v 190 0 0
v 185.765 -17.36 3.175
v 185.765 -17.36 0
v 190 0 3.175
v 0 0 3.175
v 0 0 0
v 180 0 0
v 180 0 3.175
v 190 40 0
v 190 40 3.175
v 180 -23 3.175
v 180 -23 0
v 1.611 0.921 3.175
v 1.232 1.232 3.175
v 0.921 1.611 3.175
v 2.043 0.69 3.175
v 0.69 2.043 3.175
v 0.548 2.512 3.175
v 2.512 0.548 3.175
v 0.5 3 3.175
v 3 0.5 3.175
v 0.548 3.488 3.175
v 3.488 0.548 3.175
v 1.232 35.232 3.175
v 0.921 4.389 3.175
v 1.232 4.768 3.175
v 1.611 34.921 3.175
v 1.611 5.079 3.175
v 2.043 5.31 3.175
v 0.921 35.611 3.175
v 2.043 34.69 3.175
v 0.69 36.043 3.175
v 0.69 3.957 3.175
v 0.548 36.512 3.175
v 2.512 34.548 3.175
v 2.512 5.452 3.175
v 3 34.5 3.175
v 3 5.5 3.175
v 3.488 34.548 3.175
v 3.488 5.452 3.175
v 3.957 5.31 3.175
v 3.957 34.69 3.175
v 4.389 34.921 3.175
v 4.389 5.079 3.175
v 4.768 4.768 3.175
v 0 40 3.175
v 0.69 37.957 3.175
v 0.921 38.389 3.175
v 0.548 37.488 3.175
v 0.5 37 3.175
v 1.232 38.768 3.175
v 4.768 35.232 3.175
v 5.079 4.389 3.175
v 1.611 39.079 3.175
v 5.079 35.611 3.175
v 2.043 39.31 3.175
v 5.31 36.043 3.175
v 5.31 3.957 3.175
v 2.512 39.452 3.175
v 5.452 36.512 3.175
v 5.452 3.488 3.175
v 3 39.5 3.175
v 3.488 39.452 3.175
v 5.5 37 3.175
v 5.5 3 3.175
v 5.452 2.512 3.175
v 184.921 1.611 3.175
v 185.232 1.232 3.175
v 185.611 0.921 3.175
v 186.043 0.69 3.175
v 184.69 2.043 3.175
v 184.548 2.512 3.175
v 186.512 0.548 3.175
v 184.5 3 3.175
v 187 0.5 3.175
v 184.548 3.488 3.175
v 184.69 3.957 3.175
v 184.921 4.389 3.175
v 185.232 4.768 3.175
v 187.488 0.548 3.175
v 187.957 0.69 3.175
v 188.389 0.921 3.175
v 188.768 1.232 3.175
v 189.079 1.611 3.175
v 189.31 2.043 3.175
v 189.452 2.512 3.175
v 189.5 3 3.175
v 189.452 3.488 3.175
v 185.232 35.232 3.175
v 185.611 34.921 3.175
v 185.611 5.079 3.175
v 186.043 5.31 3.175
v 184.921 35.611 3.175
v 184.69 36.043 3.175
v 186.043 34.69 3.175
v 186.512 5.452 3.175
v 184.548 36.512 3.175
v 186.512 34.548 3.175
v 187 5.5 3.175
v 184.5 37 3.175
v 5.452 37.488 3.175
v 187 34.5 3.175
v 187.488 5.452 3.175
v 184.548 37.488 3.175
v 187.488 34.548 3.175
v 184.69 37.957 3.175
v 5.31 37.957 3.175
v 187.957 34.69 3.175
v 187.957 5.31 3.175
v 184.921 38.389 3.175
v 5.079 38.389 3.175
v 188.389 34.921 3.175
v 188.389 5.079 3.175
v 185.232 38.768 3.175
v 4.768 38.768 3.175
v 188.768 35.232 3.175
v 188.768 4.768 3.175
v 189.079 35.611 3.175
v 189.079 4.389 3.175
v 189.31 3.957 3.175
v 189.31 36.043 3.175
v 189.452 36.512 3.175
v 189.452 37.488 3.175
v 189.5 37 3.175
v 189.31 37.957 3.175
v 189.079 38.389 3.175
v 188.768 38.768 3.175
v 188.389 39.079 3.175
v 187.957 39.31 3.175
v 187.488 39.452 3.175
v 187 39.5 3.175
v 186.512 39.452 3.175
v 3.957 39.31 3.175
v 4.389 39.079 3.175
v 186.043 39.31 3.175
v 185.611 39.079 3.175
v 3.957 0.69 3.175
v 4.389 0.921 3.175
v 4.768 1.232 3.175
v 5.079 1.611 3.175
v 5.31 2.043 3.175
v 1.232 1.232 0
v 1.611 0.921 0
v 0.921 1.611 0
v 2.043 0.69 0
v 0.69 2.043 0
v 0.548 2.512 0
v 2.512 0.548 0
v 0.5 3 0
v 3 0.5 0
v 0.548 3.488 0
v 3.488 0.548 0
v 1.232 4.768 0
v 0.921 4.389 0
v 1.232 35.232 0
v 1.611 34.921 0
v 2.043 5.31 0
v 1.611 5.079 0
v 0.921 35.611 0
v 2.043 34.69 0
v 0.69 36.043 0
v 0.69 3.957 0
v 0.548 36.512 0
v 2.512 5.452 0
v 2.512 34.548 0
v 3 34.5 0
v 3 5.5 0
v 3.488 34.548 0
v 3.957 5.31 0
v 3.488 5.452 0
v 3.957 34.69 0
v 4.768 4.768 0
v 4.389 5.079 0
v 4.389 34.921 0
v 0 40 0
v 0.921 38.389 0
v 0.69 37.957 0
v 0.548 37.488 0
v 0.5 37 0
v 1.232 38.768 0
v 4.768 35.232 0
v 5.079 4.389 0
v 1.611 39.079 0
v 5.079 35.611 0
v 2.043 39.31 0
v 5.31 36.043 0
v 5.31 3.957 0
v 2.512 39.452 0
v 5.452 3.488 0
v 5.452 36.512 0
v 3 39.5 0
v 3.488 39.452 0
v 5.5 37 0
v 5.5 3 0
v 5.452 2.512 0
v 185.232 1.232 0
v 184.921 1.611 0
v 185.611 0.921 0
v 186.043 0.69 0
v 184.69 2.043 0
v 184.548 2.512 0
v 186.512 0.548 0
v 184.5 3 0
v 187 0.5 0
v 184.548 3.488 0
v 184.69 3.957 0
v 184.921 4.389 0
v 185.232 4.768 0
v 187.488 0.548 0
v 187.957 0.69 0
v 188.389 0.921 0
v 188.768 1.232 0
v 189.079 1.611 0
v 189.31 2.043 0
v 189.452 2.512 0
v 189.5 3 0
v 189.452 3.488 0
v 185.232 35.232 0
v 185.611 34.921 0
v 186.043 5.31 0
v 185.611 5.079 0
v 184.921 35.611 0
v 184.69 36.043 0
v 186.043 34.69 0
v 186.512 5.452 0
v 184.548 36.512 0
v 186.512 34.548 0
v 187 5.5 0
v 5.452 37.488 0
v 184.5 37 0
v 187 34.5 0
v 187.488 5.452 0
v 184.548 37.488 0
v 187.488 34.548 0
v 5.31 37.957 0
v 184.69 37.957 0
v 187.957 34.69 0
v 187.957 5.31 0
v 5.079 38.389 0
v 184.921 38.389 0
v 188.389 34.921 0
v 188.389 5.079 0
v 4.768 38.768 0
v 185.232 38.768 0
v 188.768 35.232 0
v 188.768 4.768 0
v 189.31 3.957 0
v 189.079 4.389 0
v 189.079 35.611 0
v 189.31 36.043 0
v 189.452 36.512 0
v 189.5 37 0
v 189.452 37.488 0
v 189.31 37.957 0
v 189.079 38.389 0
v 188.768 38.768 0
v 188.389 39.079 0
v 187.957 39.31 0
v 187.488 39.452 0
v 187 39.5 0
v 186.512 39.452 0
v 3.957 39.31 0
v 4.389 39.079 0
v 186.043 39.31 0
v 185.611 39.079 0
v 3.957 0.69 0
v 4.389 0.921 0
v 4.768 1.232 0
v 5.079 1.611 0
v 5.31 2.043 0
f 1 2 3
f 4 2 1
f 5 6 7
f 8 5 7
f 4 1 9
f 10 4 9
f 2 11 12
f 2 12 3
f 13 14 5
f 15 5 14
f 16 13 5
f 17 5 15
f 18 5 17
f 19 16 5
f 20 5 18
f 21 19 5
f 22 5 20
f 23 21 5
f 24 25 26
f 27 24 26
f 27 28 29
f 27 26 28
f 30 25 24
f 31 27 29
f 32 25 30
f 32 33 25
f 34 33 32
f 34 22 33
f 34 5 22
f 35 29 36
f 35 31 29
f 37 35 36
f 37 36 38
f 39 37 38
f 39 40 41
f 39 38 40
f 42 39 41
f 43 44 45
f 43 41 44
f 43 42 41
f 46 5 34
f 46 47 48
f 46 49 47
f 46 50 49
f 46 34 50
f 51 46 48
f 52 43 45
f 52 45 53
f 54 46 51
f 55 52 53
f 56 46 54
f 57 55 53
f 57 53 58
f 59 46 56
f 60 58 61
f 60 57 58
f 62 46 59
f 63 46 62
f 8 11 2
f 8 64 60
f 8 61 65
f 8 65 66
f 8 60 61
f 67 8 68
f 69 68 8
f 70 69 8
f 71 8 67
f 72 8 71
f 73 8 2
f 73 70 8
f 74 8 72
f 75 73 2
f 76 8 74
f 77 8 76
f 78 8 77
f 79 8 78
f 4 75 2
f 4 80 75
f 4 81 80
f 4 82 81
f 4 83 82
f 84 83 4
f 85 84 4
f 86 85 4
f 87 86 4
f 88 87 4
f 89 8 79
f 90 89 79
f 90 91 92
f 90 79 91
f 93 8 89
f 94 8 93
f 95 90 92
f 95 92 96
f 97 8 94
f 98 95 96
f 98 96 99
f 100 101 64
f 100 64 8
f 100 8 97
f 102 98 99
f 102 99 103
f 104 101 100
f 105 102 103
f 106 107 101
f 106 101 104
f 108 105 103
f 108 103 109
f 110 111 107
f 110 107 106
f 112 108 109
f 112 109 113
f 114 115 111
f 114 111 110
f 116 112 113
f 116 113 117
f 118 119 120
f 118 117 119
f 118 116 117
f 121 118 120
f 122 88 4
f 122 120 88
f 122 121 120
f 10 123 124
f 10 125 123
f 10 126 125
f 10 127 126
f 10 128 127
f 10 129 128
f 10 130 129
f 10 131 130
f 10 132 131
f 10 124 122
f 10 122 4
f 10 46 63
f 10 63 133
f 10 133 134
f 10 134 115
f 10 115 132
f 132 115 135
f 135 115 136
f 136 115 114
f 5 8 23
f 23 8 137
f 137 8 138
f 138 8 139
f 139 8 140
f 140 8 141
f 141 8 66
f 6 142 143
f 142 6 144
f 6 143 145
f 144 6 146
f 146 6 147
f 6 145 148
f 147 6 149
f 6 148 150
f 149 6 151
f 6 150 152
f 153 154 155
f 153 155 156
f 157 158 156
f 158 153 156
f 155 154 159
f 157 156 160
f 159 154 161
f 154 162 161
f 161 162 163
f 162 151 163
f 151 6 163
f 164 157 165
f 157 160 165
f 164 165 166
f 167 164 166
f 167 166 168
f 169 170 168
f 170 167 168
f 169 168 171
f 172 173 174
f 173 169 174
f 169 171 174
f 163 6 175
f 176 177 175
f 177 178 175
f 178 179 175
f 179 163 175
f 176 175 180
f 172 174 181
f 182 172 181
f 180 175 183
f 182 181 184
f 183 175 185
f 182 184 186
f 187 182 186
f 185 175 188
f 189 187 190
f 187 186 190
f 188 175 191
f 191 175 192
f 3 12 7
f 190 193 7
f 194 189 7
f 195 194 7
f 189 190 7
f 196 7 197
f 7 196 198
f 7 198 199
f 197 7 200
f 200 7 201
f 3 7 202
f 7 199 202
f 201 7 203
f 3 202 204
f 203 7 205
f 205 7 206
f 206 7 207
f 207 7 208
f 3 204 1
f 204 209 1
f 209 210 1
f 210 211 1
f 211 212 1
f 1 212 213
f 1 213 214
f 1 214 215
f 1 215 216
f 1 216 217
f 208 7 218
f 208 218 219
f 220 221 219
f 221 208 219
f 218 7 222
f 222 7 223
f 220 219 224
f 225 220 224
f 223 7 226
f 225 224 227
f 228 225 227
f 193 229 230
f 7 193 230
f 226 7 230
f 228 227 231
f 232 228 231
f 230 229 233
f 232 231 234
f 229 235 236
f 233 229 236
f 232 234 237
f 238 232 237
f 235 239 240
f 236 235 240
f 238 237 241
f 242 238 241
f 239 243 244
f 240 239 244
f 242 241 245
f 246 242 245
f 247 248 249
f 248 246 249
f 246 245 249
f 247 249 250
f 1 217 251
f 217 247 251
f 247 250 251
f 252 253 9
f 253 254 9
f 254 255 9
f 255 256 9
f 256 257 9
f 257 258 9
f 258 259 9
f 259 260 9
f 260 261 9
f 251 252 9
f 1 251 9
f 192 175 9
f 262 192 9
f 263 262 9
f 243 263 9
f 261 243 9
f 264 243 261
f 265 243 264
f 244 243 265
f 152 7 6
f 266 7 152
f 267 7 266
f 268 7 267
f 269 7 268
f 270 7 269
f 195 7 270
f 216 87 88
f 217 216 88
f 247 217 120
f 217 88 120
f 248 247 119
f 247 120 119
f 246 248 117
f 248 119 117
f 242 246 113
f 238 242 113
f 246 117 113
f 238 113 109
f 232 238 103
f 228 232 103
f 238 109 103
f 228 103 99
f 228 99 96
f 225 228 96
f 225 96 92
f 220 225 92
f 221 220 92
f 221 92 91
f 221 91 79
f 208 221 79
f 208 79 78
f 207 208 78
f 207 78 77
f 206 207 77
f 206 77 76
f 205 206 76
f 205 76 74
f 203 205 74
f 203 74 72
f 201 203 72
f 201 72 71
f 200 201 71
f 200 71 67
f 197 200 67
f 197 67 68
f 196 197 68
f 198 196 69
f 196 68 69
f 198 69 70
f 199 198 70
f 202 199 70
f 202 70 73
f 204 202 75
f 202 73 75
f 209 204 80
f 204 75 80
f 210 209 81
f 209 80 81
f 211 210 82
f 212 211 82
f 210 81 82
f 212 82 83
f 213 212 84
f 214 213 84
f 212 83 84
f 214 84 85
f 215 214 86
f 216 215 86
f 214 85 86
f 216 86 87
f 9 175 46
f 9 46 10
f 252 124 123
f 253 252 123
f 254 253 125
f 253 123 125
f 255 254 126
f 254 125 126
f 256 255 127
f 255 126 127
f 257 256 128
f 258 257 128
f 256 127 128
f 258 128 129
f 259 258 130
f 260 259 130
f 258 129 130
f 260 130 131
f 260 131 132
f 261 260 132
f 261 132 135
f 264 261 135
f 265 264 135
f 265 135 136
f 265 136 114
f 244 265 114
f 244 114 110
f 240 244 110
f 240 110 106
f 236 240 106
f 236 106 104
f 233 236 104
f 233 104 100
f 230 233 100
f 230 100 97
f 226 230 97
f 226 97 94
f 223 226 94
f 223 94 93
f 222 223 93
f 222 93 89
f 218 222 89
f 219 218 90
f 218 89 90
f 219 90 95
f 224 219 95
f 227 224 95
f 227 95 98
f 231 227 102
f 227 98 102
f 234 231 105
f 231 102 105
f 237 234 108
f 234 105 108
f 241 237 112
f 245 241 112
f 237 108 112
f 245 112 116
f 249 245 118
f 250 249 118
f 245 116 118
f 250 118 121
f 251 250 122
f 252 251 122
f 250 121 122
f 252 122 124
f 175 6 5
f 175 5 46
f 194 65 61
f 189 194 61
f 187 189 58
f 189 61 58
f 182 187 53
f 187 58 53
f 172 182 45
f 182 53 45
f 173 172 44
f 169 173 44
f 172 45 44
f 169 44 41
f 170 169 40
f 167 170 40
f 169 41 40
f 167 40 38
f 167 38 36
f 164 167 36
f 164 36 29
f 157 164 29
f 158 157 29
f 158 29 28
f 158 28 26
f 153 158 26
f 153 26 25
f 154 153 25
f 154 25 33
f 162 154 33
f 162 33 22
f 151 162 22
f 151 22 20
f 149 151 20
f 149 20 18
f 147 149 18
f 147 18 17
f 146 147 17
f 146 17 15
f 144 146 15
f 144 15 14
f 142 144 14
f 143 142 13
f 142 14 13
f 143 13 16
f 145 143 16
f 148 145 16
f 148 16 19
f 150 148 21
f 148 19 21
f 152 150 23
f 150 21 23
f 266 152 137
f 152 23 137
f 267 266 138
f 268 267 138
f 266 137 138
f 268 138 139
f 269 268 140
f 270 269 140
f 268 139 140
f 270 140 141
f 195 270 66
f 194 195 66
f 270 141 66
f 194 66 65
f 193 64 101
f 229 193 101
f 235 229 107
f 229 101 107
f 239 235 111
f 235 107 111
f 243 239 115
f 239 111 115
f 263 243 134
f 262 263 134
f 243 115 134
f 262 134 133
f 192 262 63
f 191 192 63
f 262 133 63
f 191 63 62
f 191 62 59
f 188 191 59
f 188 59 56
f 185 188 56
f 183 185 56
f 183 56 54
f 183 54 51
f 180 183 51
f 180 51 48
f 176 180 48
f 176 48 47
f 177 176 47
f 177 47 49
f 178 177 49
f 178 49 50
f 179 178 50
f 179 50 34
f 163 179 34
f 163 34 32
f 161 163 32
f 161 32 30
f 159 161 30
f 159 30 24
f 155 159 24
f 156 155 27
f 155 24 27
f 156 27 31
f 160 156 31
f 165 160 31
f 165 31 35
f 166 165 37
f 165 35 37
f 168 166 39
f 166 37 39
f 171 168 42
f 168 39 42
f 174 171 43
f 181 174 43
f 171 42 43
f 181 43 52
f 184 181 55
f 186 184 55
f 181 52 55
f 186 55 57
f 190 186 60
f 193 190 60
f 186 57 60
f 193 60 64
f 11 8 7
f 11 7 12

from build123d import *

# Parameters (mm, degrees)
SKETCH1_W           = 190
SKETCH1_H           = 40
BOSS_EXTRUDE1_DEPTH = 3.175
SKETCH6_R           = 2.5
CUT_EXTRUDE2_DEPTH  = 195.190835584
BOSS_EXTRUDE2_DEPTH = 3.175


with BuildPart() as part:
    # Sketch1 → Boss-Extrude1 (new body)
    with BuildSketch(Plane.XY):
        with Locations((95, 20)):
            Rectangle(SKETCH1_W, SKETCH1_H)
    extrude(amount=BOSS_EXTRUDE1_DEPTH)

    # Sketch6 → Cut-Extrude2 (cut, through all)
    with BuildSketch(Plane.XY.offset(3.175)):
        with Locations((3, 37)):
            Circle(SKETCH6_R)
        with Locations((3, 3)):
            Circle(SKETCH6_R)
        with Locations((187, 37)):
            Circle(SKETCH6_R)
        with Locations((187, 3)):
            Circle(SKETCH6_R)
    extrude(amount=-CUT_EXTRUDE2_DEPTH, mode=Mode.SUBTRACT)

    # Sketch8 → Boss-Extrude2 (add)
    with BuildSketch(Plane.XY.offset(3.175)):
        Polygon((180, -23), (185.764662443, -17.360088892), (190, 0), (180, 0), align=None)
    extrude(amount=-BOSS_EXTRUDE2_DEPTH)


solid = part.part
